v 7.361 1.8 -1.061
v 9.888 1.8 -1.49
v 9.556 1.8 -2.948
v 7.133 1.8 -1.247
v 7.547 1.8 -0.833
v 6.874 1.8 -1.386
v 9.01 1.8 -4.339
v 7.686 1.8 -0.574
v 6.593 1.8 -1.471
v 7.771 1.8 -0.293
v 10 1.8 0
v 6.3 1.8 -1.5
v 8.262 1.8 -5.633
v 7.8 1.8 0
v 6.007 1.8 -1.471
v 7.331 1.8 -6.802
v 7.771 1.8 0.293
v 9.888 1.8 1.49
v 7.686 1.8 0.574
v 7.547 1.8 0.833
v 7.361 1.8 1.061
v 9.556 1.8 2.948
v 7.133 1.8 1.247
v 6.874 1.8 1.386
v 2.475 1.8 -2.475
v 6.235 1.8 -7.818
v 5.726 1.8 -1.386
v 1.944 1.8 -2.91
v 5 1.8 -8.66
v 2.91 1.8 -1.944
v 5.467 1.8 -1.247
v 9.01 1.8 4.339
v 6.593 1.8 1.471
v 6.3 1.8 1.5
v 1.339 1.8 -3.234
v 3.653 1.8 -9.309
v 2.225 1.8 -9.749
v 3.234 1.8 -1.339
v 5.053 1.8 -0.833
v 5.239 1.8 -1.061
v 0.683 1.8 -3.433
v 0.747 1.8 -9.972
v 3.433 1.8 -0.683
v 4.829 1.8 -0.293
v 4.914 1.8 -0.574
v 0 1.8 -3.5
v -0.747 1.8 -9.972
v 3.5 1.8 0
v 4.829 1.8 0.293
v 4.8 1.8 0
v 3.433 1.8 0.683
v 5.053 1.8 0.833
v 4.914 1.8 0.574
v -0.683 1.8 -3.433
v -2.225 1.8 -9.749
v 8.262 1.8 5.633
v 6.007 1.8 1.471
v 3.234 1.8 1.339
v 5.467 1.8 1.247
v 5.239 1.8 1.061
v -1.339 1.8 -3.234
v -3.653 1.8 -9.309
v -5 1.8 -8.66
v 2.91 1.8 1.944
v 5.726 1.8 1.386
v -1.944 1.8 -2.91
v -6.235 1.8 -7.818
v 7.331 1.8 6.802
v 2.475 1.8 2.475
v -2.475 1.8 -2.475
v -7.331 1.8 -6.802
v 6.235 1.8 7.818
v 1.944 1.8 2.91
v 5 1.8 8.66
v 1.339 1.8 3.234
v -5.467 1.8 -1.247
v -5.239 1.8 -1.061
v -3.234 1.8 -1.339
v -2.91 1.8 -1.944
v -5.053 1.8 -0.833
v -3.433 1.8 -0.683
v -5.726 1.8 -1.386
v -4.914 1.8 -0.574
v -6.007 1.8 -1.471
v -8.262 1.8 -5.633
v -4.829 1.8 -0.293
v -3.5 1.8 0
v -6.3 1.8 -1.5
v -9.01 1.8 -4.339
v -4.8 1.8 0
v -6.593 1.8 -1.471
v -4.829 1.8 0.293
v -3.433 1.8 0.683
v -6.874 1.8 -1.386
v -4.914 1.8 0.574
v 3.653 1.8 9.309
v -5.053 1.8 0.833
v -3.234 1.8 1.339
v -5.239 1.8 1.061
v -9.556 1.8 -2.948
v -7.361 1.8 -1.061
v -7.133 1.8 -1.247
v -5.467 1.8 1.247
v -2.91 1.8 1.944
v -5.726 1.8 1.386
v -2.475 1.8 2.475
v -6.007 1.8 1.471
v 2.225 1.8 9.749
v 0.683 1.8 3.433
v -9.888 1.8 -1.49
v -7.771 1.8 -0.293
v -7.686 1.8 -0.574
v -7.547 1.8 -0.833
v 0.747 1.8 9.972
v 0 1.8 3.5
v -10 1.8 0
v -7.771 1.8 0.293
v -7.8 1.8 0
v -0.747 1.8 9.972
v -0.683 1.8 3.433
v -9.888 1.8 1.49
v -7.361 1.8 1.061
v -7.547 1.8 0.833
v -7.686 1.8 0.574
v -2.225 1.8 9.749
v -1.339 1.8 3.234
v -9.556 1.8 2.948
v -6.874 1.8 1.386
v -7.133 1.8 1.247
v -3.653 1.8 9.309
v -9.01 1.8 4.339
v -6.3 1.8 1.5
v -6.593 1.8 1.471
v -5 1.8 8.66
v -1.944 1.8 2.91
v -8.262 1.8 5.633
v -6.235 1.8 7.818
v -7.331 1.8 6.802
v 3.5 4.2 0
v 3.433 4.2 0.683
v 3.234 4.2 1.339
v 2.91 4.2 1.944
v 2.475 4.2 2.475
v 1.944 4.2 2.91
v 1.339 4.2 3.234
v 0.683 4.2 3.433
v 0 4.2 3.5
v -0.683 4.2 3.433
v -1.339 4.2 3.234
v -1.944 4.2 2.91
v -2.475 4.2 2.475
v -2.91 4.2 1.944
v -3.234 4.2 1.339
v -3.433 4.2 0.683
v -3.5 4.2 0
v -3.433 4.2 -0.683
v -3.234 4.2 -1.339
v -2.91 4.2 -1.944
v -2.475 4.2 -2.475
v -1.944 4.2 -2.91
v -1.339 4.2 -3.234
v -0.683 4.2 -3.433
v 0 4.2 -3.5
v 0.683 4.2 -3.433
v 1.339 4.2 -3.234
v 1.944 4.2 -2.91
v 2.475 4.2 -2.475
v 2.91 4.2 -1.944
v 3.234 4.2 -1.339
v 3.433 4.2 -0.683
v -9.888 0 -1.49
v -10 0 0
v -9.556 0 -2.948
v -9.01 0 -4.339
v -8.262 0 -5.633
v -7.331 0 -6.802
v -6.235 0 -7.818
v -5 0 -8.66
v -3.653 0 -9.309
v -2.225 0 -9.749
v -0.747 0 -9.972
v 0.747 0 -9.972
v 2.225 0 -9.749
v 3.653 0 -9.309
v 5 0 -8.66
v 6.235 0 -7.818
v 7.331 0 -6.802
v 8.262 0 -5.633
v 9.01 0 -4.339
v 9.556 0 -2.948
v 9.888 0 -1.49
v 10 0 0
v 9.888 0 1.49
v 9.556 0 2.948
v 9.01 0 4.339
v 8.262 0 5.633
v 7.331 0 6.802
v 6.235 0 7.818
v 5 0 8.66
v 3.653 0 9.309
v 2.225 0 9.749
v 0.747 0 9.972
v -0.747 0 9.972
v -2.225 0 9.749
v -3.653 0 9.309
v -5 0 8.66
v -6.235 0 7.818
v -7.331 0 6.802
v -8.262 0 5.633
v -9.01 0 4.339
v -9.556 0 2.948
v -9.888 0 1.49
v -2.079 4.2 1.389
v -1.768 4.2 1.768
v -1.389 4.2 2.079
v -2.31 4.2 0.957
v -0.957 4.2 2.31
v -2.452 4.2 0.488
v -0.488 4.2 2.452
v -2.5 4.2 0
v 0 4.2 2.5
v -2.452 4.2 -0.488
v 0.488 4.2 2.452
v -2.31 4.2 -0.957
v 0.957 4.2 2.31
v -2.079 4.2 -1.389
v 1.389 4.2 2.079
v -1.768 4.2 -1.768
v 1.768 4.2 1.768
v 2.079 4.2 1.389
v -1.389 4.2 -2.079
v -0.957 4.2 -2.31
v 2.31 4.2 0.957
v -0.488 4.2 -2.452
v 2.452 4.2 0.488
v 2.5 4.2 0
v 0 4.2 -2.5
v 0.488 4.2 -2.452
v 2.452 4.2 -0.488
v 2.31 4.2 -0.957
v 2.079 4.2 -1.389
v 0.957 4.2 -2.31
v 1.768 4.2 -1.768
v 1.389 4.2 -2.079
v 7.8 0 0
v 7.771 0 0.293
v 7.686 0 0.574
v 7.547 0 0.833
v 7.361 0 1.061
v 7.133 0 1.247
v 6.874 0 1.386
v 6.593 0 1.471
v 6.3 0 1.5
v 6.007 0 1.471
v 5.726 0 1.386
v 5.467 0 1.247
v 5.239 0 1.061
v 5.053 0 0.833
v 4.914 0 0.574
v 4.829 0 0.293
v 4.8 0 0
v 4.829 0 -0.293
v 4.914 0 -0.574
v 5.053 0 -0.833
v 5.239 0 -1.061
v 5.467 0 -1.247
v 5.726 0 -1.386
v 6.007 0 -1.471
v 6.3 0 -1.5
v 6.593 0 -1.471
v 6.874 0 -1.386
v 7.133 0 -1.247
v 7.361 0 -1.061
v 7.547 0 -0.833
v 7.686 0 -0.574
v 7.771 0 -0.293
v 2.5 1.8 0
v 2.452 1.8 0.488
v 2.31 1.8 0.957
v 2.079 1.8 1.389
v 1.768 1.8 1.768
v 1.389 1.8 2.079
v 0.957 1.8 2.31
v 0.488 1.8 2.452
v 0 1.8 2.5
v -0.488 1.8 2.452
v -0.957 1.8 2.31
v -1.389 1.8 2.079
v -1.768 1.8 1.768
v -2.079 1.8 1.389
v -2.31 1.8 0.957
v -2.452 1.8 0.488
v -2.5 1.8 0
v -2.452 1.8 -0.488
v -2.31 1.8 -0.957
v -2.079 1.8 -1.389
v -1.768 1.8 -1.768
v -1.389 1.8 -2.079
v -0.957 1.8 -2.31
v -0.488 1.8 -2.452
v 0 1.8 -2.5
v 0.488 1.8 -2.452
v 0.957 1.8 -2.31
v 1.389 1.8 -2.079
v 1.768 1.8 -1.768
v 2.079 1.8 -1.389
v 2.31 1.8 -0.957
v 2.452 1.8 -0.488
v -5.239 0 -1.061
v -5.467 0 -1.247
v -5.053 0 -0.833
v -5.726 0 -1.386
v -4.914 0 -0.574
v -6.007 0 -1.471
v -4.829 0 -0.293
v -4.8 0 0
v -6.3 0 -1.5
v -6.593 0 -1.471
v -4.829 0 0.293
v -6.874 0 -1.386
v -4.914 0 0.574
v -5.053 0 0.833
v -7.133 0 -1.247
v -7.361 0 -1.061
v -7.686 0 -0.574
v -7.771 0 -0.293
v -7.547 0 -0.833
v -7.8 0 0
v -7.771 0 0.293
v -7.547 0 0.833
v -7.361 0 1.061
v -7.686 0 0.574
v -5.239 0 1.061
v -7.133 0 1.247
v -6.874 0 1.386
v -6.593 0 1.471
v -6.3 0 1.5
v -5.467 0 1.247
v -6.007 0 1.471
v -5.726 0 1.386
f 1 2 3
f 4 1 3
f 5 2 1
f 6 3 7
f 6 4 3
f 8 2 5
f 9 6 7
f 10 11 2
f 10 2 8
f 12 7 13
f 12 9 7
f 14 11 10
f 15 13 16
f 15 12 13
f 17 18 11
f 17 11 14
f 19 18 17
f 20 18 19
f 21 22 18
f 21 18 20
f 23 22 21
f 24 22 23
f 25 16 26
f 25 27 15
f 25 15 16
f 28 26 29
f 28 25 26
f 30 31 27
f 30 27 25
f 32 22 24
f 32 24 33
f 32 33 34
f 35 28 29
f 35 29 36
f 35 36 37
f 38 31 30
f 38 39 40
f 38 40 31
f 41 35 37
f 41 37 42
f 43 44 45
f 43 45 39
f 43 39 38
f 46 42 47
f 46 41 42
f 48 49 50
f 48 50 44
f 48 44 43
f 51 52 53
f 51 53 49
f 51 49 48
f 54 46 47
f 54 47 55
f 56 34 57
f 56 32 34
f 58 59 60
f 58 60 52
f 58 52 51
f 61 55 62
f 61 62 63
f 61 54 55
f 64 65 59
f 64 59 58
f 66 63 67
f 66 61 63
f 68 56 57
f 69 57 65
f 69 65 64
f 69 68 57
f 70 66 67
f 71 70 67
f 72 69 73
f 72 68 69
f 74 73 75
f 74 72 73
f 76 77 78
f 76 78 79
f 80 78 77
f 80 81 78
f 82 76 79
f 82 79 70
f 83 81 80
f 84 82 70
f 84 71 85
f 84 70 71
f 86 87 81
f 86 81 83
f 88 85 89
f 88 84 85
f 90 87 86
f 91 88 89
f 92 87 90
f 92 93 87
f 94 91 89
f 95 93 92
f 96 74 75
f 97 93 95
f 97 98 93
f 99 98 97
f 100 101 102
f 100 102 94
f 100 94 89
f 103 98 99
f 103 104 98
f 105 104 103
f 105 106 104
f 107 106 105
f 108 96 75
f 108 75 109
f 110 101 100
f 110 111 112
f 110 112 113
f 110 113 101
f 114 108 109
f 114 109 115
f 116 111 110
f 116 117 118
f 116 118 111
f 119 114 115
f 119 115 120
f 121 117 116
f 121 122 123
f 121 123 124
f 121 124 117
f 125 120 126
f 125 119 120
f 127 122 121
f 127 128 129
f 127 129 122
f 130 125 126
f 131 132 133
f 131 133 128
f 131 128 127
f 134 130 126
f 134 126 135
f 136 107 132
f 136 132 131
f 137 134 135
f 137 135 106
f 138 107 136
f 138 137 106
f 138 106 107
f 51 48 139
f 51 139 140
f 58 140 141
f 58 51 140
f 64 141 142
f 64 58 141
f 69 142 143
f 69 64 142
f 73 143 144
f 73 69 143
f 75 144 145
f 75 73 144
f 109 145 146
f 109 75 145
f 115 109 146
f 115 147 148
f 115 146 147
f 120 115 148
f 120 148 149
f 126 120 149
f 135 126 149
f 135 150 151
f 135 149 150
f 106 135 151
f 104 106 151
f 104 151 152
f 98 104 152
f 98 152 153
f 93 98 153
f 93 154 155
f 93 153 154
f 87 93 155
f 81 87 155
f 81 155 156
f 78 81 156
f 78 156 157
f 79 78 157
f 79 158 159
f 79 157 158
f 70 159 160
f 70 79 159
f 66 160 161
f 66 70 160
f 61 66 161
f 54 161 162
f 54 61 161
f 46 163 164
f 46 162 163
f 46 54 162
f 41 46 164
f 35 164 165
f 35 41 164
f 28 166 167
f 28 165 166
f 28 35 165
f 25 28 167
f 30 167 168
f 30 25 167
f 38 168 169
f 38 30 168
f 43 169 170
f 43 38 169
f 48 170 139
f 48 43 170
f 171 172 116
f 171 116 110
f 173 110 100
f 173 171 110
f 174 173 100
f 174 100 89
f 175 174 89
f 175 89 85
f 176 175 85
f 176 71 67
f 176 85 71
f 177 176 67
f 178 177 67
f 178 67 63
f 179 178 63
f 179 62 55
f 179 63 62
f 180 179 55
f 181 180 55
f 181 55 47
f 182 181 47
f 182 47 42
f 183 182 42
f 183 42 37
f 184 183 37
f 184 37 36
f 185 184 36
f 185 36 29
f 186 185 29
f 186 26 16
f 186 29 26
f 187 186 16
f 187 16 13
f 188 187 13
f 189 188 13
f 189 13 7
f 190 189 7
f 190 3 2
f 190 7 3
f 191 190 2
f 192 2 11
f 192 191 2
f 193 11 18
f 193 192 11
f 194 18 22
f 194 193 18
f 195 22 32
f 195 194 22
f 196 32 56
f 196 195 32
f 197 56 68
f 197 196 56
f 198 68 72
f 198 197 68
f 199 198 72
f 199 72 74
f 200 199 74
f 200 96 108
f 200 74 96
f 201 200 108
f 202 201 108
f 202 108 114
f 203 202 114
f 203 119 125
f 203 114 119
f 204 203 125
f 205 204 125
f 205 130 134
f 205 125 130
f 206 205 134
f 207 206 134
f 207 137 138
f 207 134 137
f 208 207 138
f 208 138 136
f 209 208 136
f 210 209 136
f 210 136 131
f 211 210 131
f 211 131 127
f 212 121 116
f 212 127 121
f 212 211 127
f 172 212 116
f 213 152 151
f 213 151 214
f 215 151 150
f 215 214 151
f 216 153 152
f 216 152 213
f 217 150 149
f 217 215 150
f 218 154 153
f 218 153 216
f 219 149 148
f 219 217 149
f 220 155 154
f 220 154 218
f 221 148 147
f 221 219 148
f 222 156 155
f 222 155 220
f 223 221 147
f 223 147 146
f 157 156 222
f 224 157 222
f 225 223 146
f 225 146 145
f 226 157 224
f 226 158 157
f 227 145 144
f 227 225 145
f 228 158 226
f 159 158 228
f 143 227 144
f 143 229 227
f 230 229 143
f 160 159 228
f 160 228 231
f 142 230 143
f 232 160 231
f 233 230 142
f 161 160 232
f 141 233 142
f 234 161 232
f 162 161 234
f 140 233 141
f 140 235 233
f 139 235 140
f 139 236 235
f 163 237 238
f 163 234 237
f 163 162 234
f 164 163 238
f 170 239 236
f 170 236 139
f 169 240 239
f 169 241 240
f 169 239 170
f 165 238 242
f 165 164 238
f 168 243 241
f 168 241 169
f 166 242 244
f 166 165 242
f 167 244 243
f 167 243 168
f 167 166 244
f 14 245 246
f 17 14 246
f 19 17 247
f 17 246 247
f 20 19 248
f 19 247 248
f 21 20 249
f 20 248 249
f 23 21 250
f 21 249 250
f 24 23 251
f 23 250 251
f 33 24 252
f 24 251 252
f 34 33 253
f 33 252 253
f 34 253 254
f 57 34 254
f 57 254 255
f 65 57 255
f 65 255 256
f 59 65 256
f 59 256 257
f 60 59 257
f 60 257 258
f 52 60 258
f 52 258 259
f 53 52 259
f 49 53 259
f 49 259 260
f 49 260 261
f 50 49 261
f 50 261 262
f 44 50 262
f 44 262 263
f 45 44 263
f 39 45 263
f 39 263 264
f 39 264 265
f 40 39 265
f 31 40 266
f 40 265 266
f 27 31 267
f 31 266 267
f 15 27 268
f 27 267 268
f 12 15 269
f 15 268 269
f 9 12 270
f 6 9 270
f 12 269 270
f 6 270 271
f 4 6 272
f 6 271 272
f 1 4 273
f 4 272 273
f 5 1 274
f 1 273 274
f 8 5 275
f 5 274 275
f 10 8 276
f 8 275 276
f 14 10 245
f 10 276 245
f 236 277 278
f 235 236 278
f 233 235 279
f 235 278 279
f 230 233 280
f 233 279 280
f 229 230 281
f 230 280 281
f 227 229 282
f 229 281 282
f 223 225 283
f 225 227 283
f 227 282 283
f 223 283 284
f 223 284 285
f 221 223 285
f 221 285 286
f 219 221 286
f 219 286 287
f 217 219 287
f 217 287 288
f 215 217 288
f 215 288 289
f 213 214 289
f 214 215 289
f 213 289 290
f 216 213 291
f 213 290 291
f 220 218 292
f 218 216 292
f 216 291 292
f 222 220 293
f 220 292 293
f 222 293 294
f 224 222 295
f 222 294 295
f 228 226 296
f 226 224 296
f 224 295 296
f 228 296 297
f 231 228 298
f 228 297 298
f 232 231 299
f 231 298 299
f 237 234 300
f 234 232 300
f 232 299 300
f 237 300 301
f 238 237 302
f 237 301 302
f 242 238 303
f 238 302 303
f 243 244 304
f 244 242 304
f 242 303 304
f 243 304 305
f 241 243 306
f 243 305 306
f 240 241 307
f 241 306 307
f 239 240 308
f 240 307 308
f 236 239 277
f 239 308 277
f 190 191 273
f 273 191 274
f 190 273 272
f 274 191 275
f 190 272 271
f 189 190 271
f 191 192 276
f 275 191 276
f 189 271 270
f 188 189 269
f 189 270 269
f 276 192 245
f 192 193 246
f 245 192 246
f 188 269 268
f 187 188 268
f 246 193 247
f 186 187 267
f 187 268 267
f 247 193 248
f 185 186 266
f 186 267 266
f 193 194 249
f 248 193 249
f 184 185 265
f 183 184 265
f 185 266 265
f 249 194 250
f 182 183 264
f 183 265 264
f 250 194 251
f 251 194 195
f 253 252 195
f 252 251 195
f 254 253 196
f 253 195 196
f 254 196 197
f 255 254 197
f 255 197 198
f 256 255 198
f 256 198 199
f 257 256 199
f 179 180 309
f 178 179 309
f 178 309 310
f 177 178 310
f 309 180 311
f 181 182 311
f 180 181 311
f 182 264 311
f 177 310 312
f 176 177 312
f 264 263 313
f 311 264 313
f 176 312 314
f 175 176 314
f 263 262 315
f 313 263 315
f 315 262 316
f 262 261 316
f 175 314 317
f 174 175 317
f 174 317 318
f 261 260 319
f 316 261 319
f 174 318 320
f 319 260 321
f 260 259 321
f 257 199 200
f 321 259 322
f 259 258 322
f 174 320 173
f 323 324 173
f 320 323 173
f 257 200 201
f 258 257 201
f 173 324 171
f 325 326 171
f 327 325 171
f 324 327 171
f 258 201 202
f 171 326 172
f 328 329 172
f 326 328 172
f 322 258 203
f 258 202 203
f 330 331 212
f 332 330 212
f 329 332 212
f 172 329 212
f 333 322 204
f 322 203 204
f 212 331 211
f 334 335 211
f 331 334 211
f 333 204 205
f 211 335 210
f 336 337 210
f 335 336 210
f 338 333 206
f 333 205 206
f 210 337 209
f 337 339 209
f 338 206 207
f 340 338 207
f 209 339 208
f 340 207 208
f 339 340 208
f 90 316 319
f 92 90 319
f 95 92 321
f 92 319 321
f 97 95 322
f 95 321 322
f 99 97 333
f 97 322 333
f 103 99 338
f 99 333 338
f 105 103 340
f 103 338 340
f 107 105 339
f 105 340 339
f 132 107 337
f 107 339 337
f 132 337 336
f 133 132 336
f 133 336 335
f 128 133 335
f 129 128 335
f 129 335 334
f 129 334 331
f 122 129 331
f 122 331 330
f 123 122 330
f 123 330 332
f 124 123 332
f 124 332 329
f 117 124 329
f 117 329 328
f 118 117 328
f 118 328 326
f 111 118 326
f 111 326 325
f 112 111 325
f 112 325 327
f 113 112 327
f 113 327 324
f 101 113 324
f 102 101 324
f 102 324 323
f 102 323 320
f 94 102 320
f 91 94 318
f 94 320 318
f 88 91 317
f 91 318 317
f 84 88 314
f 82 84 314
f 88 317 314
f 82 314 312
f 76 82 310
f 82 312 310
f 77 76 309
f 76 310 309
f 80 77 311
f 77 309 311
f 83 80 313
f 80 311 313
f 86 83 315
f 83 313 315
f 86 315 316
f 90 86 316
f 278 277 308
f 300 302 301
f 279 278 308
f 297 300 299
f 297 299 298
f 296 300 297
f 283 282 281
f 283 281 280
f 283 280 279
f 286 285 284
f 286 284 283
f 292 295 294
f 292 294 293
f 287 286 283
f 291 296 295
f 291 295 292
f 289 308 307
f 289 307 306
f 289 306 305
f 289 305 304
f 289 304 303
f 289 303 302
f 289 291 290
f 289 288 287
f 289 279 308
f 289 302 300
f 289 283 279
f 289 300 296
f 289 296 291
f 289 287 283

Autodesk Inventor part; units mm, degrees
ref_plane "YZ Plane" through (0, 0, 0) normal (1, 0, 0) x (0, 1, 0)
ref_plane "XZ Plane" through (0, 0, 0) normal (0, 1, 0) x (-1, 0, 0)
ref_plane "XY Plane" through (0, 0, 0) normal (0, 0, 1) x (1, 0, 0)
sketch "Sketch1" plane through (0, 0, 0) normal (0, 1, 0) x (-1, 0, 0)
  circle A0 centre (0, 0) radius 10
  dimension "d0" = 20
extrude "Extrusion1" add sketch "Sketch1" along normal blind 1.8
sketch "Sketch3" plane through (0, 1.8, 0) normal (0, 1, 0) x (1, 0, 0)
  circle A0 centre (0, 0) radius 10 projected
  circle A1 centre (0, 0) radius 3.5
  circle A2 centre (0, 0) radius 2.5
  dimension "d3" = 7
  dimension "d4" = 5
extrude "Extrusion2" add sketch "Sketch3" along normal blind 2.4 contours A1
sketch "Sketch4" plane through (0, 0, 0) normal (0, -1, 0) x (1, 0, 0)
  circle A0 centre (0, 0) radius 10 projected
  line L0 (0, 0) -> (6.3, 0)
  circle A1 centre (6.3, 0) radius 1.5
  dimension "d7" = 6.3
  dimension "d8" = 3
extrude "Extrusion3" cut sketch "Sketch4" against normal blind 2.4 contours A1
sketch "Sketch5" plane through (0, 0, 0) normal (0, -1, 0) x (1, 0, 0)
  circle A0 centre (0, 0) radius 10 projected
  line L0 (0, 0) -> (-6.3, 0)
  circle A1 centre (-6.3, 0) radius 1.5
  dimension "d11" = 6.3
  dimension "d12" = 3
extrude "Extrusion4" cut sketch "Sketch5" against normal blind 2 contours A1
properties part number "paka2_micro"
